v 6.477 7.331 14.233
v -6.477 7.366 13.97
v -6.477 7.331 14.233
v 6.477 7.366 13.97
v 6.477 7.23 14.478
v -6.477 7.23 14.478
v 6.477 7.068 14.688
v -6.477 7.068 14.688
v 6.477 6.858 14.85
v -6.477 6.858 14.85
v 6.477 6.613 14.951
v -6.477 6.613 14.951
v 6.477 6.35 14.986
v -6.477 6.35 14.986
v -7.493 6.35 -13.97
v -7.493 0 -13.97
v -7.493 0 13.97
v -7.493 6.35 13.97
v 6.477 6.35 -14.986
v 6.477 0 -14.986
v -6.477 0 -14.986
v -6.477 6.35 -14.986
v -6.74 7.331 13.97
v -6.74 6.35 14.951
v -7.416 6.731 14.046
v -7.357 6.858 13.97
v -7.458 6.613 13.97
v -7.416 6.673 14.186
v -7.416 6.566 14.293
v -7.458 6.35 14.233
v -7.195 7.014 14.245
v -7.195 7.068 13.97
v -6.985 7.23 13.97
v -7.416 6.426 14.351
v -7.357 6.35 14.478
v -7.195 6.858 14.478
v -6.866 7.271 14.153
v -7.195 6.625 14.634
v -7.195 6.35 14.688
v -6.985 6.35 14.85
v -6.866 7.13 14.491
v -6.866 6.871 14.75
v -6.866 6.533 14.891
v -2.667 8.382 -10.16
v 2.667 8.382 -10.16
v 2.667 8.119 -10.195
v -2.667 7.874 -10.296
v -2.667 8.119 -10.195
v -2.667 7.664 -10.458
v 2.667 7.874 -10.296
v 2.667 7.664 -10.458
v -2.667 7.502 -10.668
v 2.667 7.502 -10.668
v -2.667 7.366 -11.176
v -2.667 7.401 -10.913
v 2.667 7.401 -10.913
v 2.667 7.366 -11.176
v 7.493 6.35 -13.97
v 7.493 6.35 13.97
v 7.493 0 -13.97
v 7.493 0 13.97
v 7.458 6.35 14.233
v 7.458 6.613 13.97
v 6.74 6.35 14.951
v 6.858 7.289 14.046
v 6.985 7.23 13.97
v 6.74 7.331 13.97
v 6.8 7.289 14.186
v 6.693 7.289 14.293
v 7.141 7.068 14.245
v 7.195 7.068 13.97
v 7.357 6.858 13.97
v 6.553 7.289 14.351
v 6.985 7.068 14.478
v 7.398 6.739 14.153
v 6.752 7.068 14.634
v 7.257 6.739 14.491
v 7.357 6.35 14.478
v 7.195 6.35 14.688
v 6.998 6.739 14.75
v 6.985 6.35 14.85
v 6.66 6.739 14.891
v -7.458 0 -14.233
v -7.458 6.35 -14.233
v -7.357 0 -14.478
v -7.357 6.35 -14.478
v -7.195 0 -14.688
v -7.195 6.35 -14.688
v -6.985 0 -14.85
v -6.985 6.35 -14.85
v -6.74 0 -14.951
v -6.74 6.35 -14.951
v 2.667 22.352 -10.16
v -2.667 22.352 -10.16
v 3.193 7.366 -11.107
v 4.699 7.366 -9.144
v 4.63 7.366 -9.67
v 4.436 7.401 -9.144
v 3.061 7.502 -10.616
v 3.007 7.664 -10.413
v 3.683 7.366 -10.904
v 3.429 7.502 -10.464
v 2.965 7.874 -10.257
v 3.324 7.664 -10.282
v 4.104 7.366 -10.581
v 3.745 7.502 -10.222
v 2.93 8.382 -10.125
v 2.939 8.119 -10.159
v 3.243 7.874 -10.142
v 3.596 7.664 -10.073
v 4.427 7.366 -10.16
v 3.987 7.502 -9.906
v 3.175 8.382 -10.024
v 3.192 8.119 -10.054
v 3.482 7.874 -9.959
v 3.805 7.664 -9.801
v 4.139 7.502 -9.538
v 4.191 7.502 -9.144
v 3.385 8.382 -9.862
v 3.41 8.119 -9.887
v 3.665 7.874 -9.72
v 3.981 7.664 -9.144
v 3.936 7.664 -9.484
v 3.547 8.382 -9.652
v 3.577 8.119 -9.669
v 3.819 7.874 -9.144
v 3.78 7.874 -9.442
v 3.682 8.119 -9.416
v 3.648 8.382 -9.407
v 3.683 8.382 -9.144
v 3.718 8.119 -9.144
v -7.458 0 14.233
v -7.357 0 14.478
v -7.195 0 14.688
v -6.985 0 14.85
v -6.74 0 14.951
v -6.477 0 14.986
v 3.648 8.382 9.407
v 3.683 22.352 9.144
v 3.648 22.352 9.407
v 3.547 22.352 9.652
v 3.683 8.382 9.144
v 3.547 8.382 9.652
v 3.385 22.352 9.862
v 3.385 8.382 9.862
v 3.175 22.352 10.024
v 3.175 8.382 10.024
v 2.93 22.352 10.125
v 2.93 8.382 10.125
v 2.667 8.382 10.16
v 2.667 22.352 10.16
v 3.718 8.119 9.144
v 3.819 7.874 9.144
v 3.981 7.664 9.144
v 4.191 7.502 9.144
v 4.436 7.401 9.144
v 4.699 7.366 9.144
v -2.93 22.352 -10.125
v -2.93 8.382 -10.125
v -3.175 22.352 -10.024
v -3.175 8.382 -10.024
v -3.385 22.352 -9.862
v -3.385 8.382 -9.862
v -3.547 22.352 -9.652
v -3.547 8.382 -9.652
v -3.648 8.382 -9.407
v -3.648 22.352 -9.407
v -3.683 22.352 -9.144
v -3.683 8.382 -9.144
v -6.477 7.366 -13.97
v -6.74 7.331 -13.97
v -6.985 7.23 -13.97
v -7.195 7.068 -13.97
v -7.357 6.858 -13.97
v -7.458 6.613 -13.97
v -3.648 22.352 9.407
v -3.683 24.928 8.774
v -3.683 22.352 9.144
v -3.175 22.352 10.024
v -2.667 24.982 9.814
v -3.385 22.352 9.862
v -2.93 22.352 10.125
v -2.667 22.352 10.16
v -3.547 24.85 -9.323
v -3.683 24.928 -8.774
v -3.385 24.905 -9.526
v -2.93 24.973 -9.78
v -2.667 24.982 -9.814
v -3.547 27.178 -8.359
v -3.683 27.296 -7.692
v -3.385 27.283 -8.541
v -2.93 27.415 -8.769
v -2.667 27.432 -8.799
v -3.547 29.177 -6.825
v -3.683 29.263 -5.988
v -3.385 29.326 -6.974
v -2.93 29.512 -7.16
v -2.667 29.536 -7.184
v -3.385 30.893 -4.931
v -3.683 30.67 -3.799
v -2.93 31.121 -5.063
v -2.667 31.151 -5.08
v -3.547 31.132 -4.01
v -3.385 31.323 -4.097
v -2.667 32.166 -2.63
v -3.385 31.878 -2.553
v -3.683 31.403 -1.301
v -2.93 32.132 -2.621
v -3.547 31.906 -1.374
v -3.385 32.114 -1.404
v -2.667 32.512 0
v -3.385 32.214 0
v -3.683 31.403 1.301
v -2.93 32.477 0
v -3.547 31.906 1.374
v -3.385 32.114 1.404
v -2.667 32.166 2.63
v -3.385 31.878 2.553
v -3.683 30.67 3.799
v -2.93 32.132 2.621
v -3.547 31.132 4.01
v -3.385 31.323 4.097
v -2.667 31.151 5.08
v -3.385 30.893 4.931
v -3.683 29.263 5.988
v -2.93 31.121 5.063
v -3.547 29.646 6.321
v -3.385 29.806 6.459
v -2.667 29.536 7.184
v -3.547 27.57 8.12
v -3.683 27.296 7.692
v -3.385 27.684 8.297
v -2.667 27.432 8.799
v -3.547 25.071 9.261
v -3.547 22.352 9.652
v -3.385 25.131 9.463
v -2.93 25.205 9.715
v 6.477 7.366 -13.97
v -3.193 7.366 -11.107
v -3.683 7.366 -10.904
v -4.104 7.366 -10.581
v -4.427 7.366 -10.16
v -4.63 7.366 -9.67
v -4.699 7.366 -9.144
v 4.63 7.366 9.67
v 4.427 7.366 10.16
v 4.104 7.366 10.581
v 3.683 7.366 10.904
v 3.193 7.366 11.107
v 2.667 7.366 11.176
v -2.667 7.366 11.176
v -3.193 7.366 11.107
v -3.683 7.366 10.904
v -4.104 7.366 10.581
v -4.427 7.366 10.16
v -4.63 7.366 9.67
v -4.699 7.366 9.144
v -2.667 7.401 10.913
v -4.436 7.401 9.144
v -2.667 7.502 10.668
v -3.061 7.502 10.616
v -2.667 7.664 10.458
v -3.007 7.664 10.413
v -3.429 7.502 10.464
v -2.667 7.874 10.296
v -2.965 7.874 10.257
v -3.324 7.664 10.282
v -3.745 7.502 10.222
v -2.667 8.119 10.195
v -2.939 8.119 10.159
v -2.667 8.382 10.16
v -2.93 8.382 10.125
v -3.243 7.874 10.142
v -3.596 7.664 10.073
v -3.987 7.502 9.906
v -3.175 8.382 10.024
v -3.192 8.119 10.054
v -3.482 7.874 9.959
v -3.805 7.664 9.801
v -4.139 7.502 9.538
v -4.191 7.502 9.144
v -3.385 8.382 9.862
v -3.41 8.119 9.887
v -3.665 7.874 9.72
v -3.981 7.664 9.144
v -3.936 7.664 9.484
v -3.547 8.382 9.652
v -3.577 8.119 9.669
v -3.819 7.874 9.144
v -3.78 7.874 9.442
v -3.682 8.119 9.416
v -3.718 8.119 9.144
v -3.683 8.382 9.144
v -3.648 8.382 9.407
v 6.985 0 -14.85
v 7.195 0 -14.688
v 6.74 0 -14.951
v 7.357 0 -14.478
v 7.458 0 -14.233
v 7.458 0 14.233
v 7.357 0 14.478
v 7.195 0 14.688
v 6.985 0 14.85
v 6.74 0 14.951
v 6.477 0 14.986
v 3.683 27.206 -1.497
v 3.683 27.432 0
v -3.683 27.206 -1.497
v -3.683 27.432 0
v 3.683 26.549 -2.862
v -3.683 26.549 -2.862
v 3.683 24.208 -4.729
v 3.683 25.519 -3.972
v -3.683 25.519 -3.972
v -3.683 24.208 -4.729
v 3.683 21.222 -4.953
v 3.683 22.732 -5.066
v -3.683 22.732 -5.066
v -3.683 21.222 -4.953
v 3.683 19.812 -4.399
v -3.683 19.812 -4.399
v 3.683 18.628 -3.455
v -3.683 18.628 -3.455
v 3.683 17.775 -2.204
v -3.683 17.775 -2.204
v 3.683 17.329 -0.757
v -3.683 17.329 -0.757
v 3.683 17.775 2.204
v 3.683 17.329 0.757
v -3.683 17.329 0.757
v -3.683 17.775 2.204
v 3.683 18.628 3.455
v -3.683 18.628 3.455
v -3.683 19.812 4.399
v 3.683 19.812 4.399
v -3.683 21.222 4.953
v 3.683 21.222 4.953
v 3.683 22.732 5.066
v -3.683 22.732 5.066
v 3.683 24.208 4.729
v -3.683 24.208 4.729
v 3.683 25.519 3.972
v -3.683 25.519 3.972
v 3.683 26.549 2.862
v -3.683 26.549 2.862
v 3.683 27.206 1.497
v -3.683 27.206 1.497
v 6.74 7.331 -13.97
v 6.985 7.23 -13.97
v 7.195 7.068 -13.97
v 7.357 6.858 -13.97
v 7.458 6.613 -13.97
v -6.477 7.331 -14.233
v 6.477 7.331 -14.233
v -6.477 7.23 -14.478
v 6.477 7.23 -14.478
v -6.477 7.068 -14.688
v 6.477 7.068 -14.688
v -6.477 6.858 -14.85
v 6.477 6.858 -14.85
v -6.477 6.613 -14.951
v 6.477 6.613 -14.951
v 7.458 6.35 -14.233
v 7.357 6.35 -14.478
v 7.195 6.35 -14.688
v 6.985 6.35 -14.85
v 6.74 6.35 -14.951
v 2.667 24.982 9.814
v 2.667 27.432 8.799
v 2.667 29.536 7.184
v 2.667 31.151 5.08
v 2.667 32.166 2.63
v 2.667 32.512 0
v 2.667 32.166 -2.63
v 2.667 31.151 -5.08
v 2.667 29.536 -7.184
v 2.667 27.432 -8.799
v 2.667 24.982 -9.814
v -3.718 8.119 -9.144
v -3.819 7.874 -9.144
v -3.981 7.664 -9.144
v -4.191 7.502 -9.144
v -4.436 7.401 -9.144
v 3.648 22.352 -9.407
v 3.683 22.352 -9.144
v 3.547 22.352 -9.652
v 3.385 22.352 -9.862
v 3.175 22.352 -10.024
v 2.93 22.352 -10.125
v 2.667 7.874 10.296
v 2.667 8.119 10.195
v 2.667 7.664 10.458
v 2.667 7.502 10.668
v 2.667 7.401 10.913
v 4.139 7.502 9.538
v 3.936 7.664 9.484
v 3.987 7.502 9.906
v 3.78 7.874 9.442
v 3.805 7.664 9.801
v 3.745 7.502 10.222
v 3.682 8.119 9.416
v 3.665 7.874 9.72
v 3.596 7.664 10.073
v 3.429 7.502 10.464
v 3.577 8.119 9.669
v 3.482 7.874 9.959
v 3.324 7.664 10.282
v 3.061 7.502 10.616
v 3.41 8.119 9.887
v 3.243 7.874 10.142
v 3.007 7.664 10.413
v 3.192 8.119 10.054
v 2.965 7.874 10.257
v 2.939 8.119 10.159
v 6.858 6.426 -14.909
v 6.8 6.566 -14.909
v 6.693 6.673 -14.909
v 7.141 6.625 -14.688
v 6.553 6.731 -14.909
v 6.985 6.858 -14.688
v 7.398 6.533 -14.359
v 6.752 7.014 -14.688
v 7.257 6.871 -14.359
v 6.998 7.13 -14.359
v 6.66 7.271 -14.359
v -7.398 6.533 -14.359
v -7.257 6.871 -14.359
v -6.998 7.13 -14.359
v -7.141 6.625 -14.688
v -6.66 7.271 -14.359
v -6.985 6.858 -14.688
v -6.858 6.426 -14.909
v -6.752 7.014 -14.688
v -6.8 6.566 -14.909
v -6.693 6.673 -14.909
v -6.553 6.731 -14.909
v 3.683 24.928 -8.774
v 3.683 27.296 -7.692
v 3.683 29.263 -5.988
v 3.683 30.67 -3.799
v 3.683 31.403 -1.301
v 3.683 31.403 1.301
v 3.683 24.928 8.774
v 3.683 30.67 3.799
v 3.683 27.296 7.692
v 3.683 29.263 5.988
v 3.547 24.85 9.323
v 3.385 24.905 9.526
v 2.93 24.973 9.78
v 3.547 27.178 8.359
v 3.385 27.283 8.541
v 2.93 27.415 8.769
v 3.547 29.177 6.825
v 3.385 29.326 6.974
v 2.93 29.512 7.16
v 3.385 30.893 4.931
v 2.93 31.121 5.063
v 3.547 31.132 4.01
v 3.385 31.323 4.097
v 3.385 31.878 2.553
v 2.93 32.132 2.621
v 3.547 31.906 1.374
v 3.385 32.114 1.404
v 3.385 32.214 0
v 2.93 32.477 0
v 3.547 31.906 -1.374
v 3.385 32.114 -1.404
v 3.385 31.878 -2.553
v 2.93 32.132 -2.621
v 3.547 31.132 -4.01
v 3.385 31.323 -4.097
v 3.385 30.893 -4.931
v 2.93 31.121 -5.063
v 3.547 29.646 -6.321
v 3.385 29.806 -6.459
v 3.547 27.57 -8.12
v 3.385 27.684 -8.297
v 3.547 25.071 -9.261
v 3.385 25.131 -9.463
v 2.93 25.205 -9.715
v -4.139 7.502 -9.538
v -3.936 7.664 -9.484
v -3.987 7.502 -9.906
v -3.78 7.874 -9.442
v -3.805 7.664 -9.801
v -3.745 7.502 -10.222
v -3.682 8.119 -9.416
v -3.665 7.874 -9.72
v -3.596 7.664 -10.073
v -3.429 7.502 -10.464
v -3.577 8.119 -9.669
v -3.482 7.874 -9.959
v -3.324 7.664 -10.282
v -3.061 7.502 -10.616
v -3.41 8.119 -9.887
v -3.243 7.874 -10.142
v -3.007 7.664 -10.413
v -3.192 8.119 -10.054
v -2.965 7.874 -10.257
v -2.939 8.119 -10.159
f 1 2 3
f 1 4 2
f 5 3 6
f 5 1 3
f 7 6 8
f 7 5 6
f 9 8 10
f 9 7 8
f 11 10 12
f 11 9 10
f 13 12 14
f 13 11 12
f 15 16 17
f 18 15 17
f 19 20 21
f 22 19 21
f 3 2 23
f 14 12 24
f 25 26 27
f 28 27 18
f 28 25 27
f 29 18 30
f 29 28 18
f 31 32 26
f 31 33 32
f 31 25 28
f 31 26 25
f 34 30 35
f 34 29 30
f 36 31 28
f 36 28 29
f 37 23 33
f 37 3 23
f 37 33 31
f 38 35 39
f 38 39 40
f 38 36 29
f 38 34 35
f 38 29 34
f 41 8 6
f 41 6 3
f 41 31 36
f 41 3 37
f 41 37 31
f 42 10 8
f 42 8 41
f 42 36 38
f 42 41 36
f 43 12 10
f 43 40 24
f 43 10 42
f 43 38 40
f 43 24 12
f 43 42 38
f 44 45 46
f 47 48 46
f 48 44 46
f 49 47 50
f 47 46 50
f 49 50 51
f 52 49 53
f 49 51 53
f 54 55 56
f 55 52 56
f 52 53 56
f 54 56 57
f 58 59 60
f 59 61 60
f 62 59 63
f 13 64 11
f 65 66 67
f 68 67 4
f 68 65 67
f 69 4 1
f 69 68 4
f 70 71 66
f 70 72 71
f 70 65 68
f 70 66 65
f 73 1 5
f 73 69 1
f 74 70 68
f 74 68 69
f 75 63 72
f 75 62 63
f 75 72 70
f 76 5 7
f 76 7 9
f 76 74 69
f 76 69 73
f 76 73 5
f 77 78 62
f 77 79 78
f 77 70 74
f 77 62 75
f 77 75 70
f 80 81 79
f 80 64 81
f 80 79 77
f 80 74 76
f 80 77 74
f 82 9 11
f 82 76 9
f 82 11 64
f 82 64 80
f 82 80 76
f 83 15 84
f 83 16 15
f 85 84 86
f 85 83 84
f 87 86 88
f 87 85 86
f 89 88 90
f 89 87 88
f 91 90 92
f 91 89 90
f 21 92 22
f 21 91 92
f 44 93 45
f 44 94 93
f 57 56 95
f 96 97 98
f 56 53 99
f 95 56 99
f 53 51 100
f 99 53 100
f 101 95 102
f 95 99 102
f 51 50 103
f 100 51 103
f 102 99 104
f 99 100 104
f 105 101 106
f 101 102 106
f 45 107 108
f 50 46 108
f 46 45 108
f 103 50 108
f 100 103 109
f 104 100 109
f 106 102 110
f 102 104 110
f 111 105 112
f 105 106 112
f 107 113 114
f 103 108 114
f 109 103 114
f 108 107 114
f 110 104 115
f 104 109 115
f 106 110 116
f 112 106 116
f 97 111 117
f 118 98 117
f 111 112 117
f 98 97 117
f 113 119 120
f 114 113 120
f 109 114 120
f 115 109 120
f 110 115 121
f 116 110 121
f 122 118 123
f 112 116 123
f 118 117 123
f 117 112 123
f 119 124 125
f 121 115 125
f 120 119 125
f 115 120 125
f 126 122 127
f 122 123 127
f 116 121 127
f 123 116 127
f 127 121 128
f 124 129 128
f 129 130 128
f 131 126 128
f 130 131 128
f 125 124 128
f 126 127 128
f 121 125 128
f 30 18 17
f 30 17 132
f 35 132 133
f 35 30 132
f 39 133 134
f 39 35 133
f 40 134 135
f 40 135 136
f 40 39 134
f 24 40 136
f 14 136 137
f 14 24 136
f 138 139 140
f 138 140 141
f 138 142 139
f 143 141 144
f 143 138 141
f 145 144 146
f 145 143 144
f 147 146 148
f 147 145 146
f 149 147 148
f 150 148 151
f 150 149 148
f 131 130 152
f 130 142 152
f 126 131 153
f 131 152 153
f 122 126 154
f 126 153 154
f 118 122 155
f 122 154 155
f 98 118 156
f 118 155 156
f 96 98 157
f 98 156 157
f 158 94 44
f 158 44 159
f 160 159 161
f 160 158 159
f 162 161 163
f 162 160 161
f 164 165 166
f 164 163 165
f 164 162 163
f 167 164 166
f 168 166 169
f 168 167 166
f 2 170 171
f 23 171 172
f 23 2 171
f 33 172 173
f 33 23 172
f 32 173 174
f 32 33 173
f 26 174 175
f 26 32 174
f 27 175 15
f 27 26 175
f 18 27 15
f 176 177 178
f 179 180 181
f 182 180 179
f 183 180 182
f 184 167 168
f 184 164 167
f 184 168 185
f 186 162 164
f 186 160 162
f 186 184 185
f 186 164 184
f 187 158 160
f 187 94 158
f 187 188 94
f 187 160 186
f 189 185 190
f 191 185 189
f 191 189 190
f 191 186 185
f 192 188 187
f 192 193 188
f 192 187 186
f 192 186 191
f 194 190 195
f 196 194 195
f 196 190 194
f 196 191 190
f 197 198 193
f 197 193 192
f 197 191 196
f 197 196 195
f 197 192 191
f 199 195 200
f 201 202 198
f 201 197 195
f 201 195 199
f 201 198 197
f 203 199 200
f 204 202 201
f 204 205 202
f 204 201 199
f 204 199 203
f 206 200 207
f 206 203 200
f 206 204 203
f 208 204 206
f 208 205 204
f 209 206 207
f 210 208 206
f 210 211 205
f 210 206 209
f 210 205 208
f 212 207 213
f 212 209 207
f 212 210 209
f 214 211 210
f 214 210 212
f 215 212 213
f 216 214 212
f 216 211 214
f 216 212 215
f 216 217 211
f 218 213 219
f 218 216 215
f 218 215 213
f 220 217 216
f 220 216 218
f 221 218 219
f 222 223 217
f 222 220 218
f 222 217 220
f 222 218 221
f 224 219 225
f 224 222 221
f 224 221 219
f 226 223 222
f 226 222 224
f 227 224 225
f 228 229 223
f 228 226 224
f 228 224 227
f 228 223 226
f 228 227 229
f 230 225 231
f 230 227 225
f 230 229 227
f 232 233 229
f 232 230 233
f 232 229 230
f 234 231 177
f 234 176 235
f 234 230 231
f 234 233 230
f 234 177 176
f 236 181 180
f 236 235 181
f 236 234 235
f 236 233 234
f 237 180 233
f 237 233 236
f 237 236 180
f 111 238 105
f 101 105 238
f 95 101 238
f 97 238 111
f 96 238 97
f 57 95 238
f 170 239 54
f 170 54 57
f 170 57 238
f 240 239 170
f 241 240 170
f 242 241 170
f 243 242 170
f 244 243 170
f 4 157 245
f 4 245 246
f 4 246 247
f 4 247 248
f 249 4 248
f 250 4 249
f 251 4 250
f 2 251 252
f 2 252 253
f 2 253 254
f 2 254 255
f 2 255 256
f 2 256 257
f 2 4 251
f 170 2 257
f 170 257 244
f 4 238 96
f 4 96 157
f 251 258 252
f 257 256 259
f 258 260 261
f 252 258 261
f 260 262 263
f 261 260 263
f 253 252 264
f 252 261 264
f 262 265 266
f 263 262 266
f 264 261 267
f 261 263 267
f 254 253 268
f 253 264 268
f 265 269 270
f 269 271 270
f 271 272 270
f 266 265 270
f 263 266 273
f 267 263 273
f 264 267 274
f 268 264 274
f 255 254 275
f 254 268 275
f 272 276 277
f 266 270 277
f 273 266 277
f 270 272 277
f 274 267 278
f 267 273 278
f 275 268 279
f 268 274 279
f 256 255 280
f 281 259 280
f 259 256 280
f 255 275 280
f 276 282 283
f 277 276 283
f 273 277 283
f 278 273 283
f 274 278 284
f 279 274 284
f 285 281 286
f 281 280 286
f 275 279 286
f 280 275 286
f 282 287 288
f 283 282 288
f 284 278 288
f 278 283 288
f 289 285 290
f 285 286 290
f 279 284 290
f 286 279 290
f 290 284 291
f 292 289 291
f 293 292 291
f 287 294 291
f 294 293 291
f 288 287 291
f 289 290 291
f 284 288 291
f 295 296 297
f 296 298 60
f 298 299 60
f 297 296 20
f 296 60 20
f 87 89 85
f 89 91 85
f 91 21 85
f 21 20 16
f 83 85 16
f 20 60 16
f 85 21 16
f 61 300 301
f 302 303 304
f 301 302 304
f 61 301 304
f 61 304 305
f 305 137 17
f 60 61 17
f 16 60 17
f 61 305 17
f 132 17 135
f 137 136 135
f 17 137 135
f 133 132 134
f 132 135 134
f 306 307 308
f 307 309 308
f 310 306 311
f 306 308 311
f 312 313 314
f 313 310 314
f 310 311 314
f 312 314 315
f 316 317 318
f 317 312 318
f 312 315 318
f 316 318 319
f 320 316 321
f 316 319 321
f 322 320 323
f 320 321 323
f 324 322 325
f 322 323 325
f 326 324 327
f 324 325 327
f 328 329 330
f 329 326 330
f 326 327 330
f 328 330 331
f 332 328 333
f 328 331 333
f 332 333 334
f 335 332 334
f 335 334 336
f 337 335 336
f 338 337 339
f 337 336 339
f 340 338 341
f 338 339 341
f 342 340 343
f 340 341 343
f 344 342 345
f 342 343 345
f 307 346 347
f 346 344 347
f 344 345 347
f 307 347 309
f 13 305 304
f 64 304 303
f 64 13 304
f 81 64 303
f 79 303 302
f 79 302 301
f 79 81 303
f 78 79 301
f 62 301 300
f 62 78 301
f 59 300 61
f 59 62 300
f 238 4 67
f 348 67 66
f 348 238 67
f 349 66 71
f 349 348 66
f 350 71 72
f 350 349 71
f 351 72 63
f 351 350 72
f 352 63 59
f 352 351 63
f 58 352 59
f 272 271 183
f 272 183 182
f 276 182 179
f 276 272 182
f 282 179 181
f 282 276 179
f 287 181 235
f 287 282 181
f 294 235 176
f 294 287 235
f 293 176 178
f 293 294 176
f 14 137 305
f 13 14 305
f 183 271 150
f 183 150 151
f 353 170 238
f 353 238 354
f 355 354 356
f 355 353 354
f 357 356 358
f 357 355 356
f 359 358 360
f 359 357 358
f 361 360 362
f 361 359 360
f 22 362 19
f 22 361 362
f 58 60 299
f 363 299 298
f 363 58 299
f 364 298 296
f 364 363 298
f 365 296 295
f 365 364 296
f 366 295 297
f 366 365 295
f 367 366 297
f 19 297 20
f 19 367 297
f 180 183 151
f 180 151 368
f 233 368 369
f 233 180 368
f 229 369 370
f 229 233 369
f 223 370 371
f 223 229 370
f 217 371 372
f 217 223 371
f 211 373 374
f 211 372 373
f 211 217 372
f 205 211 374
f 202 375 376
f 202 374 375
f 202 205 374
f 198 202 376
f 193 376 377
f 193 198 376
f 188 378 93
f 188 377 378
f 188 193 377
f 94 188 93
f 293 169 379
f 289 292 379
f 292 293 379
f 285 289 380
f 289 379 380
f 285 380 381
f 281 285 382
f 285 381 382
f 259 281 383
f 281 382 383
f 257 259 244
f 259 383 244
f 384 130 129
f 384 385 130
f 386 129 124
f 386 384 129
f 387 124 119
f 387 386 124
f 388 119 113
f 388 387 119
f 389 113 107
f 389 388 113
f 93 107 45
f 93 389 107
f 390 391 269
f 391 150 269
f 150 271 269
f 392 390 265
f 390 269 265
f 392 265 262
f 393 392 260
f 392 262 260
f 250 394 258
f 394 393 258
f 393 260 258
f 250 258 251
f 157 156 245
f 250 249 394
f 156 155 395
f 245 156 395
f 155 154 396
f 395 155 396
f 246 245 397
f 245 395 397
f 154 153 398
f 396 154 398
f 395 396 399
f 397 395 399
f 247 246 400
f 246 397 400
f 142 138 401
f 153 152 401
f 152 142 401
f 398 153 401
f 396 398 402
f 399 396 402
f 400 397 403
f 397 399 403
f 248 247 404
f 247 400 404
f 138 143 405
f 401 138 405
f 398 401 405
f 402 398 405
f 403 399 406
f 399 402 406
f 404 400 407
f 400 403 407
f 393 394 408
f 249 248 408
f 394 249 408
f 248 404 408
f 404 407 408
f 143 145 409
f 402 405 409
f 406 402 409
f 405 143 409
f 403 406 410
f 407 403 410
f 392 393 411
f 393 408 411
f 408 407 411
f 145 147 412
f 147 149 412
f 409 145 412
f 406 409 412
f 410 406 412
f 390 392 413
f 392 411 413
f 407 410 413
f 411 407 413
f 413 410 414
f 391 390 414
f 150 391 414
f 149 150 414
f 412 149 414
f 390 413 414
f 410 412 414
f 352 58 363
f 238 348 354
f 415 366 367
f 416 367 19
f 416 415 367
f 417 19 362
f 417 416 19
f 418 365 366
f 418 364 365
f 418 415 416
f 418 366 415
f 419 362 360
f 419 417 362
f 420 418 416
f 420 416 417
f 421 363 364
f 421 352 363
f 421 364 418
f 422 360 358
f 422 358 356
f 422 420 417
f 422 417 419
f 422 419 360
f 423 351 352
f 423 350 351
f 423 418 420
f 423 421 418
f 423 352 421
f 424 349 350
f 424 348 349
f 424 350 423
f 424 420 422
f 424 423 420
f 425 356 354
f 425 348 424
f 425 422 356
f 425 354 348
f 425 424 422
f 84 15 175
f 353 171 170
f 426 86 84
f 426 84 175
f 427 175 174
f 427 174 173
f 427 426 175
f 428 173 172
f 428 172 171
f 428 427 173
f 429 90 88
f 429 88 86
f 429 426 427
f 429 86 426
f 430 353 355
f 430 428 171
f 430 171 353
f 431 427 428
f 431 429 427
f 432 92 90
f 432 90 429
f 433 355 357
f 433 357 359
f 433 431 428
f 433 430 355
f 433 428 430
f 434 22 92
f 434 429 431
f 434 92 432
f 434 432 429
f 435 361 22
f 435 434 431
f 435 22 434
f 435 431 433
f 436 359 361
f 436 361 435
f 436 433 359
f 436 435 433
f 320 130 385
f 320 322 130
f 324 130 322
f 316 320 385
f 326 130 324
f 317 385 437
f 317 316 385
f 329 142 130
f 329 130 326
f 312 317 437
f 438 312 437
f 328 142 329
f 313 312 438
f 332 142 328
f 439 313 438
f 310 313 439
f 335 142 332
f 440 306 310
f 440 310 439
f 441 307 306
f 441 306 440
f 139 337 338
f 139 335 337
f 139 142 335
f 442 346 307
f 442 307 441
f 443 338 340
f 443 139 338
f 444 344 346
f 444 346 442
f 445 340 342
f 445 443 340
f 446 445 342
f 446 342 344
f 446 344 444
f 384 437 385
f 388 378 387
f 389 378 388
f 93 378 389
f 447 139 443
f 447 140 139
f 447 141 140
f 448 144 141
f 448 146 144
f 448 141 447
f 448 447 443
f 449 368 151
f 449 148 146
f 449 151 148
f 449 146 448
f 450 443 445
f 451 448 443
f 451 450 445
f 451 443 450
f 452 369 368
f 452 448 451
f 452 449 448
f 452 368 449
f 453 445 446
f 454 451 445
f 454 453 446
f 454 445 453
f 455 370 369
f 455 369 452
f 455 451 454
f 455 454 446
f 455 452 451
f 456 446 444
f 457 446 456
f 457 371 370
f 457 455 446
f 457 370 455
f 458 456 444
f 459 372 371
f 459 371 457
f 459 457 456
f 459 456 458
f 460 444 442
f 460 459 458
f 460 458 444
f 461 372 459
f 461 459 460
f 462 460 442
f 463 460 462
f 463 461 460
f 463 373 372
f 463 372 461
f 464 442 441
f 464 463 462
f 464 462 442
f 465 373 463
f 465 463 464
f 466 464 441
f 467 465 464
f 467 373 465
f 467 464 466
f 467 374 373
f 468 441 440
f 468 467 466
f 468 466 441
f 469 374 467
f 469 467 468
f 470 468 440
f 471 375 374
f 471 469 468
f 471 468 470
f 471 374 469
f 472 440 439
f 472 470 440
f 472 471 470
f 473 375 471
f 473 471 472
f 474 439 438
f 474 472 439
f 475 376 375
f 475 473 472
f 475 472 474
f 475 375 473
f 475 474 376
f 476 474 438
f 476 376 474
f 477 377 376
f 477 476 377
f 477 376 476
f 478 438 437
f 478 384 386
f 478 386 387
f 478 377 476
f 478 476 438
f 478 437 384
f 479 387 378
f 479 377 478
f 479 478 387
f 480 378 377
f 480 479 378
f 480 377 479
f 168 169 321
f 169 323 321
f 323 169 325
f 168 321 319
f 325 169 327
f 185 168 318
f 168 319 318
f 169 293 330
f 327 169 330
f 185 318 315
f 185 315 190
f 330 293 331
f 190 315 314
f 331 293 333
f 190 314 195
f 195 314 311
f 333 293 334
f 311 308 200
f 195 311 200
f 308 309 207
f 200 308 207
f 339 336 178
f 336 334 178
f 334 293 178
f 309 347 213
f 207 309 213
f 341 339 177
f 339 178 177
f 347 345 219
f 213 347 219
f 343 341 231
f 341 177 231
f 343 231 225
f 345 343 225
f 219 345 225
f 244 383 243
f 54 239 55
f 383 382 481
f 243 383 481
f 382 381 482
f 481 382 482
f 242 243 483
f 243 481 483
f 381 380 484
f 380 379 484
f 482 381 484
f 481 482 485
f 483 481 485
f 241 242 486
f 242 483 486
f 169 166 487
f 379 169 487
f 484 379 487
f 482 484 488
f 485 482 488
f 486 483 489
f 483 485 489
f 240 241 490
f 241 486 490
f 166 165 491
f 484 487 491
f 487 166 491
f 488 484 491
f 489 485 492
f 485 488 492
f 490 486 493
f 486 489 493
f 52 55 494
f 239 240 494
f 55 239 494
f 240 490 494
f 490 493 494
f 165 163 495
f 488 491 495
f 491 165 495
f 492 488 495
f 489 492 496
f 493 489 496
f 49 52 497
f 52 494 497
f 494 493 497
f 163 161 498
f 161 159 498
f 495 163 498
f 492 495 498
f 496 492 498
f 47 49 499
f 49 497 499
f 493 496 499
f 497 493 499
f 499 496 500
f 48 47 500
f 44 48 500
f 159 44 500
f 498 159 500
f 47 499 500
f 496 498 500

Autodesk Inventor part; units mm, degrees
ref_plane "YZ Plane" through (0, 0, 0) normal (1, 0, 0) x (0, 1, 0)
ref_plane "XZ Plane" through (0, 0, 0) normal (0, 1, 0) x (-1, 0, 0)
ref_plane "XY Plane" through (0, 0, 0) normal (0, 0, 1) x (1, 0, 0)
sketch "Sketch1" plane through (0, 0, 0) normal (0, 1, 0) x (-1, 0, 0)
  line L0 (7.493, 14.986) -> (-7.493, 14.986)
  line L1 (-7.493, 14.986) -> (-7.493, -14.986)
  line L2 (-7.493, -14.986) -> (7.493, -14.986)
  line L3 (7.493, -14.986) -> (7.493, 14.986)
  line L4 (7.493, 14.986) -> (-7.493, -14.986) construction
  line L5 (-7.493, 14.986) -> (7.493, -14.986) construction
  point P0 (0, 0)
  dimension "d0" = 29.972
  dimension "d1" = 14.986
extrude "Extrusion1" add sketch "Sketch1" along normal blind 7.366
sketch "Sketch2" plane through (0, 0, 0) normal (1, 0, 0) x (0, 1, 0)
  line L0 (7.366, 14.986) -> (7.366, -14.986) projected
  line L1 (7.366, 10.16) -> (22.352, 10.16)
  arc A0 (22.352, -10.16) -> (22.352, 10.16) centre (22.352, 0) ccw
  line L2 (22.352, -10.16) -> (7.366, -10.16)
  line L3 (7.366, 10.16) -> (7.366, -10.16)
  circle A1 centre (22.352, 0) radius 5.08
  point P0 (0, 0)
  dimension "d4" = 14.986
  dimension "d5" = 10.16
  dimension "d6" = 10.16
  dimension "d7" = 10.16
extrude "Extrusion2" add sketch "Sketch2" along normal mid plane 7.366
fillet "Fillet1" radius 1.016 7 edges at (7.493, 3.683, 14.986) (7.493, 7.366, 0) (7.493, 3.683, -14.986) (0, 7.366, -14.986) (0, 7.366, 14.986) (-7.493, 3.683, 14.986) (-7.493, 7.366, 0)
fillet "Fillet2" radius 1.016 6 edges at (3.683, 32.512, 0) (3.683, 14.859, -10.16) (3.683, 14.859, 10.16) (-3.683, 32.512, 0) (-3.683, 14.859, -10.16) (-3.683, 14.859, 10.16)
fillet "Fillet3" radius 1.016 8 edges at (3.3854, 7.366, 9.8624) (0, 7.366, 10.16) (-3.3854, 7.366, 9.8624) (-3.683, 7.366, 0) (-3.3854, 7.366, -9.8624) (0, 7.366, -10.16) (3.3854, 7.366, -9.8624) (3.683, 7.366, 0)
fillet "Fillet4" radius 1.016 2 edges at (-7.1954, 7.0684, -14.6884) (-7.493, 3.175, -14.986)
properties part number "Pivot"
